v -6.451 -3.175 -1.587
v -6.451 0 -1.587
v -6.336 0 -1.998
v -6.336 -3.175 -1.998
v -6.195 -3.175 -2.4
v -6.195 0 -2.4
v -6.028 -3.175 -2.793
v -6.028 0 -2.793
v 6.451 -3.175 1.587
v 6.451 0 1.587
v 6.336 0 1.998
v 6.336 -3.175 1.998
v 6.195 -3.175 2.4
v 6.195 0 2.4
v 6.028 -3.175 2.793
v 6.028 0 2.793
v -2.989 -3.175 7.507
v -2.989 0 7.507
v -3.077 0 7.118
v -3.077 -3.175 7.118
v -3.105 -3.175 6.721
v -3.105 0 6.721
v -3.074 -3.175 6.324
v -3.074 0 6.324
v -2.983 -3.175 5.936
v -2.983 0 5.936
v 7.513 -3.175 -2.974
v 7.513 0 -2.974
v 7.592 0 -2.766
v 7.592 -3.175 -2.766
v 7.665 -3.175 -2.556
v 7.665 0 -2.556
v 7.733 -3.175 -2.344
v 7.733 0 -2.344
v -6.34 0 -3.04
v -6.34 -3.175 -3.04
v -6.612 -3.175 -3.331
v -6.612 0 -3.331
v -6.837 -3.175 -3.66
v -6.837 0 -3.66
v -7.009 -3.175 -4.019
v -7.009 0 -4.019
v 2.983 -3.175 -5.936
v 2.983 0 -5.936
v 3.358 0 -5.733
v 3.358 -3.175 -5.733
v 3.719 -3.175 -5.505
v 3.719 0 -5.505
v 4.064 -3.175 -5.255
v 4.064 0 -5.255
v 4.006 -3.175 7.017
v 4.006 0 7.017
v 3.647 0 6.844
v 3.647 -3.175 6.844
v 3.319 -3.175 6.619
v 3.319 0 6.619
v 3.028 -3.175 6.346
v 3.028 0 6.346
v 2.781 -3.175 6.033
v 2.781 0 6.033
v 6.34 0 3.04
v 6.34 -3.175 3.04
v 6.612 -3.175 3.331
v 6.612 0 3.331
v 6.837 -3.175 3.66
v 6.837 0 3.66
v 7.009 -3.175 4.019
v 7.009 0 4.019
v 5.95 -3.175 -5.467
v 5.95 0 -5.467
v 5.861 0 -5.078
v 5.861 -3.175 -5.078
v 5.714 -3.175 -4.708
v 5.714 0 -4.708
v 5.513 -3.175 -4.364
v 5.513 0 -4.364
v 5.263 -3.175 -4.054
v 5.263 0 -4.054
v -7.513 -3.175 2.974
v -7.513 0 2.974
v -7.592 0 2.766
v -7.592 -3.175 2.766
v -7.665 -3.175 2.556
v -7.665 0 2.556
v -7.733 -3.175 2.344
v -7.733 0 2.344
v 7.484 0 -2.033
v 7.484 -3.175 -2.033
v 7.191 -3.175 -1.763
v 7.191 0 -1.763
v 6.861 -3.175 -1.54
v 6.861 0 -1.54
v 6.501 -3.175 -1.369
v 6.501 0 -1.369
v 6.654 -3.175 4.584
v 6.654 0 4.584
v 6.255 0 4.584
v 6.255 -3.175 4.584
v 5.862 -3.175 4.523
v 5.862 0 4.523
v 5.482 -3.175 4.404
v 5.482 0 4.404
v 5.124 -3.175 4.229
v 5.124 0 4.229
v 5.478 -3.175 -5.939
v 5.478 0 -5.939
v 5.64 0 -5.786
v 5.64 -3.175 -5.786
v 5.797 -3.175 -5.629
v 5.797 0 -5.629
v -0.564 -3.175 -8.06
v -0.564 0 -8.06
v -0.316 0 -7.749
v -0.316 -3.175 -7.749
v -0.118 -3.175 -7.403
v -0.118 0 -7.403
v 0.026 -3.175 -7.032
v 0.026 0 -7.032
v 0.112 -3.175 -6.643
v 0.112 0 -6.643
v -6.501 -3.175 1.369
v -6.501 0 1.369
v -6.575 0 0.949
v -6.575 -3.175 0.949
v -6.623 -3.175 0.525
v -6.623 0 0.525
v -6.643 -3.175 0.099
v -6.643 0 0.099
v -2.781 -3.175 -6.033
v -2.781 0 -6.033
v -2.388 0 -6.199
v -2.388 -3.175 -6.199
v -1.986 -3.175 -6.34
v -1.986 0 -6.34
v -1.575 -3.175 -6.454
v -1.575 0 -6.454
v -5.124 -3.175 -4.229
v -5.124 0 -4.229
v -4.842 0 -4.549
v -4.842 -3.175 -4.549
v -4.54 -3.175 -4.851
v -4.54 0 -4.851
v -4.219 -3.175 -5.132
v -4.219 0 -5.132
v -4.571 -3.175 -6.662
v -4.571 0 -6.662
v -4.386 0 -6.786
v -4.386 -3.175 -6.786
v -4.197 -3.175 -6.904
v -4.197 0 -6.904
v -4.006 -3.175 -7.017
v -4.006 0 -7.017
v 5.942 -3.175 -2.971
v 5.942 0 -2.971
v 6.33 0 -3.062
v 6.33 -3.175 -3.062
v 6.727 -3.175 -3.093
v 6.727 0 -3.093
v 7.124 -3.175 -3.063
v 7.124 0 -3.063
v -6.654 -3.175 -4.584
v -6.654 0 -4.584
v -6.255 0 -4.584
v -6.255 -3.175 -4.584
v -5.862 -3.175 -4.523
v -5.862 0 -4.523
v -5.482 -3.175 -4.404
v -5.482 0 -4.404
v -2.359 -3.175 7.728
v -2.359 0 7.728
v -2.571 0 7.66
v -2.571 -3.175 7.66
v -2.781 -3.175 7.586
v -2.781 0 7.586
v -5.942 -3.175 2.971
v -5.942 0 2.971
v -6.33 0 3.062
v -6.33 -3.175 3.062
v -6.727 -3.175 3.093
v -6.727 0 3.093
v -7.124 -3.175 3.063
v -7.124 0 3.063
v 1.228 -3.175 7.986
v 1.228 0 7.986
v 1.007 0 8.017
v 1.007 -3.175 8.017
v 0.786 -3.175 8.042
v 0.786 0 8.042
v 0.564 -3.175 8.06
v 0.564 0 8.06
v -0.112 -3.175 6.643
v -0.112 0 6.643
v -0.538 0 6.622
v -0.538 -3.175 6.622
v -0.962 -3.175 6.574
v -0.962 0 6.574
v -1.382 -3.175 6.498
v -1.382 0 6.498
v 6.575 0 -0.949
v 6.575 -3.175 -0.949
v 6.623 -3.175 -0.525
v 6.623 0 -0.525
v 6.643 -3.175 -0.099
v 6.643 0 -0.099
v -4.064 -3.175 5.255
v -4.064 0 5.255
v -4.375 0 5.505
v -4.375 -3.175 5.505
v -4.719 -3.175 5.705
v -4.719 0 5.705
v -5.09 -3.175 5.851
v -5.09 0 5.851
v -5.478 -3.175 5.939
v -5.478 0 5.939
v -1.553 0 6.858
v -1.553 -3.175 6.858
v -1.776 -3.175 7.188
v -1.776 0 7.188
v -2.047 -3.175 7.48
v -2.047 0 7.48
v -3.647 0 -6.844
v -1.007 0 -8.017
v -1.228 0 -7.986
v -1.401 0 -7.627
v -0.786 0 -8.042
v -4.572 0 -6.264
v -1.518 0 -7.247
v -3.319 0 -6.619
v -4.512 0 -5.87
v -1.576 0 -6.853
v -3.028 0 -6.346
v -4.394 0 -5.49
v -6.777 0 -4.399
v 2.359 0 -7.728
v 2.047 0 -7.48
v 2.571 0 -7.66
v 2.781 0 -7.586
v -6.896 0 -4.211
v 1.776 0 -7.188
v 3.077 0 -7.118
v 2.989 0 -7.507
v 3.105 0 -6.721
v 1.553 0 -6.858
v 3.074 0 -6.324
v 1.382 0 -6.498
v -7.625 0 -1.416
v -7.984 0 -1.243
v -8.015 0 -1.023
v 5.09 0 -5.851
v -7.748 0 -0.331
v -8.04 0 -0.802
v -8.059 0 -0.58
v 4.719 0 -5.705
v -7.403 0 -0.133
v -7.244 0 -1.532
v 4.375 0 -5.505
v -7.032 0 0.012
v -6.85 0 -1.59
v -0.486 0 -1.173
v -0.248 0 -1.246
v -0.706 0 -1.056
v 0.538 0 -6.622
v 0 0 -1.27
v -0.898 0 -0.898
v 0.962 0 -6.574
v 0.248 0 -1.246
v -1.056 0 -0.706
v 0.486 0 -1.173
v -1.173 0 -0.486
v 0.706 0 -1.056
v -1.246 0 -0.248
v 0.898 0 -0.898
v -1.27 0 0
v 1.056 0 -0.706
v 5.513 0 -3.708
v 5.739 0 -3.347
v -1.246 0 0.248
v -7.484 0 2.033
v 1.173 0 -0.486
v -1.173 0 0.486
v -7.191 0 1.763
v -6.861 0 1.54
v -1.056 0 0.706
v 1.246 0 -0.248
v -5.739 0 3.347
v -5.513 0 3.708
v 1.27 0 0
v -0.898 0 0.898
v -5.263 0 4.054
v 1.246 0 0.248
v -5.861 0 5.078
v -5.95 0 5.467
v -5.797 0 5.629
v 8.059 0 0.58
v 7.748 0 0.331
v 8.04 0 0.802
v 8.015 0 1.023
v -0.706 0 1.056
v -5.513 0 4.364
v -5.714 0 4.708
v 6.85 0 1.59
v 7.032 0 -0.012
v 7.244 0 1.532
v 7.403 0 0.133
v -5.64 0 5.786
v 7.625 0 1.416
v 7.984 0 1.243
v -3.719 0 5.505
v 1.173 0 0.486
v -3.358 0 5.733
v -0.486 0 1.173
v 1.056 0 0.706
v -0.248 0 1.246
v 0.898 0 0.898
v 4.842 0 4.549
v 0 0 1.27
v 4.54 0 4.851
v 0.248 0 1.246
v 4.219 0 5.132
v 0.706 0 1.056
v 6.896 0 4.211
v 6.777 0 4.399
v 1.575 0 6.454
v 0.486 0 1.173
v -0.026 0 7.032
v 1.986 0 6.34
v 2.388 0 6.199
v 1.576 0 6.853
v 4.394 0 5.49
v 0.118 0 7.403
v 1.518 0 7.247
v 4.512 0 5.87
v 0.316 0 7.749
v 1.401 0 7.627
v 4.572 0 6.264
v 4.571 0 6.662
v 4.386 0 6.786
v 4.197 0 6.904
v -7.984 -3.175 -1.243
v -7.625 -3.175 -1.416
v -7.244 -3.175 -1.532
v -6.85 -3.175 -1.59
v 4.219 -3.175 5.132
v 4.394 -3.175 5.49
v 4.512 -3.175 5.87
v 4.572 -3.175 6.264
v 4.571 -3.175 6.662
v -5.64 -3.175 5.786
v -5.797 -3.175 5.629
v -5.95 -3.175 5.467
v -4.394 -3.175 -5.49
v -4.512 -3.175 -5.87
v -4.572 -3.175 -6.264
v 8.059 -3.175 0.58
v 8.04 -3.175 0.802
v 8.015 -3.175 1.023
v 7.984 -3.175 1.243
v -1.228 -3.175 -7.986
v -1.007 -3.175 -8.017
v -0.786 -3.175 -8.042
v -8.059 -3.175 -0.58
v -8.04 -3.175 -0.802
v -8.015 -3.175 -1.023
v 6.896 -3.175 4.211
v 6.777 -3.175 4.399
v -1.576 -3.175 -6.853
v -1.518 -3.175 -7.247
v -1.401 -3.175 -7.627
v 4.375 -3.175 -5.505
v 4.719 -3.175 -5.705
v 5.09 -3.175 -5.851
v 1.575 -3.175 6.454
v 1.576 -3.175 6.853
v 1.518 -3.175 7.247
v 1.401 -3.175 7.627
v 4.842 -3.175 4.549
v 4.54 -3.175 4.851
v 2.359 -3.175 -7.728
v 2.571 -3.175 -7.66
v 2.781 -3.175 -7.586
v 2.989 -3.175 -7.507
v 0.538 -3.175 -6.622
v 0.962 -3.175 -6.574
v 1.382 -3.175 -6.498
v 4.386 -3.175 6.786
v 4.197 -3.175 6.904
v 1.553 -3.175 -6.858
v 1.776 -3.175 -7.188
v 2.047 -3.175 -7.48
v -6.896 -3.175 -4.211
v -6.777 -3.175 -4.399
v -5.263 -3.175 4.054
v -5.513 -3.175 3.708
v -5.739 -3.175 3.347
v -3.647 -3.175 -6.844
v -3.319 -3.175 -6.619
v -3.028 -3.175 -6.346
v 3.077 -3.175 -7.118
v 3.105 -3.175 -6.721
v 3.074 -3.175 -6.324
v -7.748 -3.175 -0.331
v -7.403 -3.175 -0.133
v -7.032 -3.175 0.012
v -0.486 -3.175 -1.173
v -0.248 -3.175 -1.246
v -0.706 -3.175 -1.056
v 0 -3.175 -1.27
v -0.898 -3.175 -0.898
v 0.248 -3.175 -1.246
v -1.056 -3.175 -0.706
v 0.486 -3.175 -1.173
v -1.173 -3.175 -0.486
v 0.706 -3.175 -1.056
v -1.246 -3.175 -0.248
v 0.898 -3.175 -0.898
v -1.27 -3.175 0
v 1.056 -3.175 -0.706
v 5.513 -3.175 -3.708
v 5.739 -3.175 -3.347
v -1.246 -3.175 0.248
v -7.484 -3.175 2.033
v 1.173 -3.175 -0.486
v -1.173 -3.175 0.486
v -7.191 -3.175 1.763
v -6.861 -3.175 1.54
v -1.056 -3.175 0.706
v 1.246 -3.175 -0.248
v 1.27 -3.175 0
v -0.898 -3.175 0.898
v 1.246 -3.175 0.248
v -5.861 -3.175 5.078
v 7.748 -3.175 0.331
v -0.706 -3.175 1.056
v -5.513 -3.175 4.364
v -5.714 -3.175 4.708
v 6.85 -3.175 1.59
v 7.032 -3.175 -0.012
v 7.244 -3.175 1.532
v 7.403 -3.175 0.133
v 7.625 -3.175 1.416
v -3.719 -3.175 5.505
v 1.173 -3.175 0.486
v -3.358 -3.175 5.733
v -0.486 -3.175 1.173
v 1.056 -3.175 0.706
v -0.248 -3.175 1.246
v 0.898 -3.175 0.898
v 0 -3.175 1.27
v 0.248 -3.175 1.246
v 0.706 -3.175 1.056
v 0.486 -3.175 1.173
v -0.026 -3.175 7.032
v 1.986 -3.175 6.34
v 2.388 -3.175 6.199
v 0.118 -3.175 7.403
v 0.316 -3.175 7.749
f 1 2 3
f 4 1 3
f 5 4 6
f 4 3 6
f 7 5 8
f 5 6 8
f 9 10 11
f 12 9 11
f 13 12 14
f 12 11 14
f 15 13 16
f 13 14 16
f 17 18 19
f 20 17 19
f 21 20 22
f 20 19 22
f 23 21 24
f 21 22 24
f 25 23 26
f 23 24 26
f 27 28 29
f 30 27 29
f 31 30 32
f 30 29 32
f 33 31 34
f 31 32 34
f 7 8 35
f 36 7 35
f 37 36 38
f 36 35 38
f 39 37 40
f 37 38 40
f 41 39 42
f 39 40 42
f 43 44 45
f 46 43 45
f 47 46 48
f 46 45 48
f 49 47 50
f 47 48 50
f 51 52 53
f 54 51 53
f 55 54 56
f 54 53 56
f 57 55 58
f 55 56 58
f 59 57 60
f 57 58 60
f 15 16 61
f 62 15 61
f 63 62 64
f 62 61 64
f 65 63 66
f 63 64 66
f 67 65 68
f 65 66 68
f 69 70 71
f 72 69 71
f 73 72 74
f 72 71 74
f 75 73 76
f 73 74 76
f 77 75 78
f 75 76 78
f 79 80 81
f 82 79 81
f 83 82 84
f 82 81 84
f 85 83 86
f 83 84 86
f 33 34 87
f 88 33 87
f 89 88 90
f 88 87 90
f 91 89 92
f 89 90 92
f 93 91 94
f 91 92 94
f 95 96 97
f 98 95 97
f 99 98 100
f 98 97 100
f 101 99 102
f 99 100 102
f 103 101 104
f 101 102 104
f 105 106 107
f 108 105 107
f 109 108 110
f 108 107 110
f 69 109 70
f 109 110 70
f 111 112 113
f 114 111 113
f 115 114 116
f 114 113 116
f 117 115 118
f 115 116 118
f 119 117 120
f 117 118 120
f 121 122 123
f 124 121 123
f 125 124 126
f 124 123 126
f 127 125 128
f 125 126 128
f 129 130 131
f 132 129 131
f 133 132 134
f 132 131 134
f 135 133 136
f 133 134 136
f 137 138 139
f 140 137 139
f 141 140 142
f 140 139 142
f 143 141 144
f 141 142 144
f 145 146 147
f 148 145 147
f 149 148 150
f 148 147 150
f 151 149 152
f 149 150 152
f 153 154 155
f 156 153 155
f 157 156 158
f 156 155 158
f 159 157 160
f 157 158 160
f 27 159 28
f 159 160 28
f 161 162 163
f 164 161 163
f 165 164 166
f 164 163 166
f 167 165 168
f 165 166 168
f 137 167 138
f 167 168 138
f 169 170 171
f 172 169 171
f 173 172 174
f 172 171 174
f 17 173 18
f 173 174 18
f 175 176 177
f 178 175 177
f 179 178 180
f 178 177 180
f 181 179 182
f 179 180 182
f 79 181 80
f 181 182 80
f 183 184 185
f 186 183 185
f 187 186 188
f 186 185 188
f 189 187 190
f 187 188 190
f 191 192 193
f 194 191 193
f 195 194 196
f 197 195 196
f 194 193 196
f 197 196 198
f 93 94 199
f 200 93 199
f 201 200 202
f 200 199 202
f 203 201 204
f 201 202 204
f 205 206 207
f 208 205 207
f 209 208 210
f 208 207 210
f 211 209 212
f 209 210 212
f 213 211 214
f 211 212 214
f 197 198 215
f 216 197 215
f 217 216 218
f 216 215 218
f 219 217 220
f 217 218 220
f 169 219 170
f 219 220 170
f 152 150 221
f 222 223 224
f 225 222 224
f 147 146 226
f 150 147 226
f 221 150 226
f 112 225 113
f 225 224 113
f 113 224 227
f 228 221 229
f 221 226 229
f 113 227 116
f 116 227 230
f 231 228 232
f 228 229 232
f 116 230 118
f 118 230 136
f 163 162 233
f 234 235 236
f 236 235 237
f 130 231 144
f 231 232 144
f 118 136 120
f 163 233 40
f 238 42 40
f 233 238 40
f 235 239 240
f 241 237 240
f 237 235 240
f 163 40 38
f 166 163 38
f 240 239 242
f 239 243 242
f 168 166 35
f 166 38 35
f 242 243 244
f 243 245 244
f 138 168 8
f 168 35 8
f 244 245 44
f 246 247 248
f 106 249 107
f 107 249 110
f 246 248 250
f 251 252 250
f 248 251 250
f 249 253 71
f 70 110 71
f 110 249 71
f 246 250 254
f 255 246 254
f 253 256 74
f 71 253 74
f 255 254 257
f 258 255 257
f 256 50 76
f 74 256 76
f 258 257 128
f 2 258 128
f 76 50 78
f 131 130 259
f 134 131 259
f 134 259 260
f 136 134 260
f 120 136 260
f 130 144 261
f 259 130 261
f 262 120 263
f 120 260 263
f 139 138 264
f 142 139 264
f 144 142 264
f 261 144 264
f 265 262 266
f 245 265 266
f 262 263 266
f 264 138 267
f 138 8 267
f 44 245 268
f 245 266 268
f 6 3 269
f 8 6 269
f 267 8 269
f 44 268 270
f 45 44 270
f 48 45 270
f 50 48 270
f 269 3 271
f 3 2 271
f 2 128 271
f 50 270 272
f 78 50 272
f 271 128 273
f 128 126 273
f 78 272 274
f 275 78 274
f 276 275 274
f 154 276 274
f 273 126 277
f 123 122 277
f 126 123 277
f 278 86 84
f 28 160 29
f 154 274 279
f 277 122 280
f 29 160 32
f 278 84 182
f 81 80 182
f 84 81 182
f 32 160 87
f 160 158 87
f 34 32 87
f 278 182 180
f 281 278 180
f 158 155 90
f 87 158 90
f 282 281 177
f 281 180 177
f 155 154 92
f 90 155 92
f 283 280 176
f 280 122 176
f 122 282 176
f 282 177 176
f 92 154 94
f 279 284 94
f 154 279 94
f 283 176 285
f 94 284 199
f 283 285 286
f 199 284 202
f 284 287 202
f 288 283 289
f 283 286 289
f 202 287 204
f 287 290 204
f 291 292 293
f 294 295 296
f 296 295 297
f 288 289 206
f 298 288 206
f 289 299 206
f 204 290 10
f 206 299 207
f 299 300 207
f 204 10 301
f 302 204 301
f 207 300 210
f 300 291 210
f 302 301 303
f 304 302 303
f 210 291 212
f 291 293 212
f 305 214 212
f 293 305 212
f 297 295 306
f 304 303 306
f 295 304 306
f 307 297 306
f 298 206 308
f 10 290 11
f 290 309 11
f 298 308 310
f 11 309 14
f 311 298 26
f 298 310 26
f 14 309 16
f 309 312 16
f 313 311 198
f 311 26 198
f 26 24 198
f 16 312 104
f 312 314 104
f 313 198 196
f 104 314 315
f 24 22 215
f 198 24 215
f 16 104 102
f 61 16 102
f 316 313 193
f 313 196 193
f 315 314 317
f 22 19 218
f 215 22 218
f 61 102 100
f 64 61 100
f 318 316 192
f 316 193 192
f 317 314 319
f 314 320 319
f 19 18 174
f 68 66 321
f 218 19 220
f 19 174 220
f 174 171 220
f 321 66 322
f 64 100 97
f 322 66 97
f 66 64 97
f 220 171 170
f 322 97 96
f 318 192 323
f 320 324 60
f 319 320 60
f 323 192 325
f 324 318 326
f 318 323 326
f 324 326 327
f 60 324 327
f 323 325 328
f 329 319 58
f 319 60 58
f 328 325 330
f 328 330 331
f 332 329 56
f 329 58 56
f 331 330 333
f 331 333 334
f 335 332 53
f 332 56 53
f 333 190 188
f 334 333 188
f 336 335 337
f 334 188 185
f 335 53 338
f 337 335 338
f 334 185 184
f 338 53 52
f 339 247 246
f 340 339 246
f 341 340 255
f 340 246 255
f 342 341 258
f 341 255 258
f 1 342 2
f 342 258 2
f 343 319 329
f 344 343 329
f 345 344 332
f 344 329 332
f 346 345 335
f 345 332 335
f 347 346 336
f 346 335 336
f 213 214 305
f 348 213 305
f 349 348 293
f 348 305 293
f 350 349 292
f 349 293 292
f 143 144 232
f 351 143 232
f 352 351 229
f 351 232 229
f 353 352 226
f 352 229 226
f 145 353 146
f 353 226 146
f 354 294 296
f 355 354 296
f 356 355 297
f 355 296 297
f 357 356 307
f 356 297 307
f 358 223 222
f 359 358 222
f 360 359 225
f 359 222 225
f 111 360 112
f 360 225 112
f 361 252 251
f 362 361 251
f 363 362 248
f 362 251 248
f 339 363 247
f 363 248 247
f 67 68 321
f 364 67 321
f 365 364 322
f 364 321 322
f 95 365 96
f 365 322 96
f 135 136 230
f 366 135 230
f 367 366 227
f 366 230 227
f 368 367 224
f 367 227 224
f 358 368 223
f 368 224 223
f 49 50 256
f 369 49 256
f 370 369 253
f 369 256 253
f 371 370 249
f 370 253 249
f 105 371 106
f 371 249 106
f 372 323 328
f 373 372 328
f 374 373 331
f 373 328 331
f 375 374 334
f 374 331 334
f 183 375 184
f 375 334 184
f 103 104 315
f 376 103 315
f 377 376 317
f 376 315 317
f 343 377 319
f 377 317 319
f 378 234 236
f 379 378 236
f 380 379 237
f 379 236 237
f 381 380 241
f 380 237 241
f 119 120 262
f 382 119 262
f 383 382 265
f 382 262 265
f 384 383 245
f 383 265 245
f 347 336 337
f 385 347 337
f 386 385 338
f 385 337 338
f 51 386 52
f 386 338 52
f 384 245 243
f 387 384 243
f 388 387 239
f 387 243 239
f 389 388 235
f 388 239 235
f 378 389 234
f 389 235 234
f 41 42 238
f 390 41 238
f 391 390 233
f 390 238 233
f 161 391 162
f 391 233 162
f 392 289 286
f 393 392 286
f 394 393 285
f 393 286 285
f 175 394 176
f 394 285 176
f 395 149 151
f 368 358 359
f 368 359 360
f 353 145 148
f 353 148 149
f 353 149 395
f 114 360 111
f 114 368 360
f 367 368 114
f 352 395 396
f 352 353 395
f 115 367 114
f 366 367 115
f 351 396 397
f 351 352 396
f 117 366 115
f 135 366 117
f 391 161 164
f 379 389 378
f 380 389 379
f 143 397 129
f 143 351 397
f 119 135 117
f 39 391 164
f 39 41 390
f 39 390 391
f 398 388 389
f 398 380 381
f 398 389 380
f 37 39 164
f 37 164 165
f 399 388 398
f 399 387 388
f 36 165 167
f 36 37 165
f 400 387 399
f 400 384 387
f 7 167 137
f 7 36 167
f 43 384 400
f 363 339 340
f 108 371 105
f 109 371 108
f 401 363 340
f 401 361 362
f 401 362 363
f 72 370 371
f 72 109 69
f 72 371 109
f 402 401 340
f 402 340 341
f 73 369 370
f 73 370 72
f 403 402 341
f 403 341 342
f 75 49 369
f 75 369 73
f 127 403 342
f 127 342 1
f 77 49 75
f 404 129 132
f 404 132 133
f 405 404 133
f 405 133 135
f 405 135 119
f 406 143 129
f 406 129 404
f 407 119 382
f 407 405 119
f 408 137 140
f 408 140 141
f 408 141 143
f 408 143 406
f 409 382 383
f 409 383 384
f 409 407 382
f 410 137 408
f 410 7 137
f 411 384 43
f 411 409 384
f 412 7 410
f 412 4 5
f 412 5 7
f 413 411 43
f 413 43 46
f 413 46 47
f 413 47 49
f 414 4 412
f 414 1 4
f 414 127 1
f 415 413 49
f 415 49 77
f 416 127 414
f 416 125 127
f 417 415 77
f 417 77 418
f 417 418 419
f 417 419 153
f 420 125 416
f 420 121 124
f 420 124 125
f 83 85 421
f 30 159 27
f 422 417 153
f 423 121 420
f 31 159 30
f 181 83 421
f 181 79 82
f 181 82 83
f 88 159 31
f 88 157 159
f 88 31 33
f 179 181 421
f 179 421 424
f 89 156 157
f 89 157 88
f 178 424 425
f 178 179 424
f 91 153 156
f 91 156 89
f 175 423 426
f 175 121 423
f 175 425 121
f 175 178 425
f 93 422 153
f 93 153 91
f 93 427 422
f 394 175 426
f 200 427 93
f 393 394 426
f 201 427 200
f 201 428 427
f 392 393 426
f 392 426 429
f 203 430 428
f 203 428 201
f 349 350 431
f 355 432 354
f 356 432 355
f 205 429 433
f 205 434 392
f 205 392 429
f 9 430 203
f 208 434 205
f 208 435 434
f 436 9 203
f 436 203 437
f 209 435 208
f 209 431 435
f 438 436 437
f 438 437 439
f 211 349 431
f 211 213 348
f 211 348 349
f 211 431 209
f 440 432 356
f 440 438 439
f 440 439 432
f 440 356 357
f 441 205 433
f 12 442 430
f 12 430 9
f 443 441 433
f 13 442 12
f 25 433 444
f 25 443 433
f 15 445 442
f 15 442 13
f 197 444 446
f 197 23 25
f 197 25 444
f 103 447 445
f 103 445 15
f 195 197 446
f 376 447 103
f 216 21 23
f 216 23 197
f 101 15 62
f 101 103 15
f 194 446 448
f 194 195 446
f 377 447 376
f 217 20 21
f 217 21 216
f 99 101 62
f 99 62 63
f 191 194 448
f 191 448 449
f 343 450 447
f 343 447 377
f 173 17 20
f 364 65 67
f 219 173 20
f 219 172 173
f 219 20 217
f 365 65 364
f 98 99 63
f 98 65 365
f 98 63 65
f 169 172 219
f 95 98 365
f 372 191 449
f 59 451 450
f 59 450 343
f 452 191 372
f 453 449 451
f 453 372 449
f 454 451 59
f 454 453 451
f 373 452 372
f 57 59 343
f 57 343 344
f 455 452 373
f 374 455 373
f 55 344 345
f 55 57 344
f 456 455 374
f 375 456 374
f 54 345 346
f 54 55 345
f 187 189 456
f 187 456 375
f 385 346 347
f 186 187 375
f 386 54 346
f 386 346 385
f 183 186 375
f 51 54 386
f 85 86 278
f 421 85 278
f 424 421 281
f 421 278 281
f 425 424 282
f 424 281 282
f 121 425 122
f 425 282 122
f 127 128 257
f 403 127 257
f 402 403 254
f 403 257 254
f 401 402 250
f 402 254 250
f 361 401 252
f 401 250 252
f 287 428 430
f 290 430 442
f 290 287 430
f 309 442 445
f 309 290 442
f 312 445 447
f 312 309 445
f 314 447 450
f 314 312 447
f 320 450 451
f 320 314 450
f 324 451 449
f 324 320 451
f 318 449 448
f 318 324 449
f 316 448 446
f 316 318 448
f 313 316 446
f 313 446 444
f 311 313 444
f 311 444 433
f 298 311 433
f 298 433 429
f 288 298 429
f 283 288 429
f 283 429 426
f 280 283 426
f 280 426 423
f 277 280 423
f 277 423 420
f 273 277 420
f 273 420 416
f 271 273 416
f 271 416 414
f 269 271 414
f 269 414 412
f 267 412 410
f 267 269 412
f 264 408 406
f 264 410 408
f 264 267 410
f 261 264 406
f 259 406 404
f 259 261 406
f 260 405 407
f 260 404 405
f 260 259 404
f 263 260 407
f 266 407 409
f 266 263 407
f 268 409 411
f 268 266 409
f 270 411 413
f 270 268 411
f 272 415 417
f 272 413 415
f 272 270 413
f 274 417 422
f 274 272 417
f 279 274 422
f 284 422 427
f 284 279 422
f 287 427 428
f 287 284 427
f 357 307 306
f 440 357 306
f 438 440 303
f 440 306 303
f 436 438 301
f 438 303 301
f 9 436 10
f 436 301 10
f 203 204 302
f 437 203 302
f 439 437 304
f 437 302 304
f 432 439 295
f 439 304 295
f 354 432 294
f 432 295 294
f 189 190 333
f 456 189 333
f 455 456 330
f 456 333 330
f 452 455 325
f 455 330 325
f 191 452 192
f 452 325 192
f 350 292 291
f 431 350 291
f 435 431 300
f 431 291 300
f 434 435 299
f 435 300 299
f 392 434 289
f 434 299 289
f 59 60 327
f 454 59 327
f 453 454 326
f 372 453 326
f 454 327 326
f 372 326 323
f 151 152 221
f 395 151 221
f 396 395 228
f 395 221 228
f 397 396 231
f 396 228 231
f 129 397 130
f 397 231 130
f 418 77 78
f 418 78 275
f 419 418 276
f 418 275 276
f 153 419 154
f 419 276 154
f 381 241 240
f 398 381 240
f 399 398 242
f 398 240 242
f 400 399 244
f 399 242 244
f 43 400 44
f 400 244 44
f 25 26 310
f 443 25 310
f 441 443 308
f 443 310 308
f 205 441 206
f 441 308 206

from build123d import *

# Parameters (mm, degrees)
F1_R     = 1.27
F2_DEPTH = 3.175
F3_DEPTH = 3.175
F5_COUNT = 14
F5_ANGLE = 334.2857142857


# Not quite as in the source:
# - a length typed as a fraction of an inch, garbled in the dataset ("3 / 203.2 mm" for 3/8 in), is restored


with BuildPart() as f2:
    # F1 (on Front) → F2 (new body)
    with BuildSketch(Plane.XZ):
        with BuildLine():
            ThreePointArc((6.6428889328, -0.0990154985), (6.6434423524, -0.049509124), (6.643626829, 0))
            ThreePointArc((6.643626829, 0), (6.5953592641, 0.7993832744), (6.4512579209, 1.587151121))
            ThreePointArc((6.4512579209, 1.587151121), (-6.6011332303, -0.7502116494), (6.6428889328, -0.0990154985))
        make_face()
        Circle(F1_R, mode=Mode.SUBTRACT)
    extrude(amount=F2_DEPTH)

    # F1 (on Front) → F3 (join)
    with BuildSketch(Plane.XZ):
        with BuildLine():
            ThreePointArc((6.4512579209, 1.587151121), (6.5953592641, 0.7993832744), (6.643626829, 0))
            ThreePointArc((6.643626829, 0), (6.6434423524, -0.049509124), (6.6428889328, -0.0990154985))
            ThreePointArc((6.6428889328, -0.0990154985), (7.4027472944, 0.1325210174), (8.0591667411, 0.5798546712))
            ThreePointArc((8.0591667411, 0.5798546712), (8.0283191506, 0.9124097851), (7.9837548494, 1.2434060096))
            ThreePointArc((7.9837548494, 1.2434060096), (7.2436944715, 1.5320312423), (6.4512579209, 1.587151121))
        make_face()
    extrude(amount=F3_DEPTH)

    # F5: F2 ×14 about axis
    f5_axis = Axis((0, 6.1465417966, 0), (0, 1, 0))


with BuildPart() as f2_1:
    add(f2.part)
    for i in range(1, F5_COUNT):
        add(f2.part.rotate(f5_axis, i * F5_ANGLE / (F5_COUNT - 1)))


solid = f2_1.part
